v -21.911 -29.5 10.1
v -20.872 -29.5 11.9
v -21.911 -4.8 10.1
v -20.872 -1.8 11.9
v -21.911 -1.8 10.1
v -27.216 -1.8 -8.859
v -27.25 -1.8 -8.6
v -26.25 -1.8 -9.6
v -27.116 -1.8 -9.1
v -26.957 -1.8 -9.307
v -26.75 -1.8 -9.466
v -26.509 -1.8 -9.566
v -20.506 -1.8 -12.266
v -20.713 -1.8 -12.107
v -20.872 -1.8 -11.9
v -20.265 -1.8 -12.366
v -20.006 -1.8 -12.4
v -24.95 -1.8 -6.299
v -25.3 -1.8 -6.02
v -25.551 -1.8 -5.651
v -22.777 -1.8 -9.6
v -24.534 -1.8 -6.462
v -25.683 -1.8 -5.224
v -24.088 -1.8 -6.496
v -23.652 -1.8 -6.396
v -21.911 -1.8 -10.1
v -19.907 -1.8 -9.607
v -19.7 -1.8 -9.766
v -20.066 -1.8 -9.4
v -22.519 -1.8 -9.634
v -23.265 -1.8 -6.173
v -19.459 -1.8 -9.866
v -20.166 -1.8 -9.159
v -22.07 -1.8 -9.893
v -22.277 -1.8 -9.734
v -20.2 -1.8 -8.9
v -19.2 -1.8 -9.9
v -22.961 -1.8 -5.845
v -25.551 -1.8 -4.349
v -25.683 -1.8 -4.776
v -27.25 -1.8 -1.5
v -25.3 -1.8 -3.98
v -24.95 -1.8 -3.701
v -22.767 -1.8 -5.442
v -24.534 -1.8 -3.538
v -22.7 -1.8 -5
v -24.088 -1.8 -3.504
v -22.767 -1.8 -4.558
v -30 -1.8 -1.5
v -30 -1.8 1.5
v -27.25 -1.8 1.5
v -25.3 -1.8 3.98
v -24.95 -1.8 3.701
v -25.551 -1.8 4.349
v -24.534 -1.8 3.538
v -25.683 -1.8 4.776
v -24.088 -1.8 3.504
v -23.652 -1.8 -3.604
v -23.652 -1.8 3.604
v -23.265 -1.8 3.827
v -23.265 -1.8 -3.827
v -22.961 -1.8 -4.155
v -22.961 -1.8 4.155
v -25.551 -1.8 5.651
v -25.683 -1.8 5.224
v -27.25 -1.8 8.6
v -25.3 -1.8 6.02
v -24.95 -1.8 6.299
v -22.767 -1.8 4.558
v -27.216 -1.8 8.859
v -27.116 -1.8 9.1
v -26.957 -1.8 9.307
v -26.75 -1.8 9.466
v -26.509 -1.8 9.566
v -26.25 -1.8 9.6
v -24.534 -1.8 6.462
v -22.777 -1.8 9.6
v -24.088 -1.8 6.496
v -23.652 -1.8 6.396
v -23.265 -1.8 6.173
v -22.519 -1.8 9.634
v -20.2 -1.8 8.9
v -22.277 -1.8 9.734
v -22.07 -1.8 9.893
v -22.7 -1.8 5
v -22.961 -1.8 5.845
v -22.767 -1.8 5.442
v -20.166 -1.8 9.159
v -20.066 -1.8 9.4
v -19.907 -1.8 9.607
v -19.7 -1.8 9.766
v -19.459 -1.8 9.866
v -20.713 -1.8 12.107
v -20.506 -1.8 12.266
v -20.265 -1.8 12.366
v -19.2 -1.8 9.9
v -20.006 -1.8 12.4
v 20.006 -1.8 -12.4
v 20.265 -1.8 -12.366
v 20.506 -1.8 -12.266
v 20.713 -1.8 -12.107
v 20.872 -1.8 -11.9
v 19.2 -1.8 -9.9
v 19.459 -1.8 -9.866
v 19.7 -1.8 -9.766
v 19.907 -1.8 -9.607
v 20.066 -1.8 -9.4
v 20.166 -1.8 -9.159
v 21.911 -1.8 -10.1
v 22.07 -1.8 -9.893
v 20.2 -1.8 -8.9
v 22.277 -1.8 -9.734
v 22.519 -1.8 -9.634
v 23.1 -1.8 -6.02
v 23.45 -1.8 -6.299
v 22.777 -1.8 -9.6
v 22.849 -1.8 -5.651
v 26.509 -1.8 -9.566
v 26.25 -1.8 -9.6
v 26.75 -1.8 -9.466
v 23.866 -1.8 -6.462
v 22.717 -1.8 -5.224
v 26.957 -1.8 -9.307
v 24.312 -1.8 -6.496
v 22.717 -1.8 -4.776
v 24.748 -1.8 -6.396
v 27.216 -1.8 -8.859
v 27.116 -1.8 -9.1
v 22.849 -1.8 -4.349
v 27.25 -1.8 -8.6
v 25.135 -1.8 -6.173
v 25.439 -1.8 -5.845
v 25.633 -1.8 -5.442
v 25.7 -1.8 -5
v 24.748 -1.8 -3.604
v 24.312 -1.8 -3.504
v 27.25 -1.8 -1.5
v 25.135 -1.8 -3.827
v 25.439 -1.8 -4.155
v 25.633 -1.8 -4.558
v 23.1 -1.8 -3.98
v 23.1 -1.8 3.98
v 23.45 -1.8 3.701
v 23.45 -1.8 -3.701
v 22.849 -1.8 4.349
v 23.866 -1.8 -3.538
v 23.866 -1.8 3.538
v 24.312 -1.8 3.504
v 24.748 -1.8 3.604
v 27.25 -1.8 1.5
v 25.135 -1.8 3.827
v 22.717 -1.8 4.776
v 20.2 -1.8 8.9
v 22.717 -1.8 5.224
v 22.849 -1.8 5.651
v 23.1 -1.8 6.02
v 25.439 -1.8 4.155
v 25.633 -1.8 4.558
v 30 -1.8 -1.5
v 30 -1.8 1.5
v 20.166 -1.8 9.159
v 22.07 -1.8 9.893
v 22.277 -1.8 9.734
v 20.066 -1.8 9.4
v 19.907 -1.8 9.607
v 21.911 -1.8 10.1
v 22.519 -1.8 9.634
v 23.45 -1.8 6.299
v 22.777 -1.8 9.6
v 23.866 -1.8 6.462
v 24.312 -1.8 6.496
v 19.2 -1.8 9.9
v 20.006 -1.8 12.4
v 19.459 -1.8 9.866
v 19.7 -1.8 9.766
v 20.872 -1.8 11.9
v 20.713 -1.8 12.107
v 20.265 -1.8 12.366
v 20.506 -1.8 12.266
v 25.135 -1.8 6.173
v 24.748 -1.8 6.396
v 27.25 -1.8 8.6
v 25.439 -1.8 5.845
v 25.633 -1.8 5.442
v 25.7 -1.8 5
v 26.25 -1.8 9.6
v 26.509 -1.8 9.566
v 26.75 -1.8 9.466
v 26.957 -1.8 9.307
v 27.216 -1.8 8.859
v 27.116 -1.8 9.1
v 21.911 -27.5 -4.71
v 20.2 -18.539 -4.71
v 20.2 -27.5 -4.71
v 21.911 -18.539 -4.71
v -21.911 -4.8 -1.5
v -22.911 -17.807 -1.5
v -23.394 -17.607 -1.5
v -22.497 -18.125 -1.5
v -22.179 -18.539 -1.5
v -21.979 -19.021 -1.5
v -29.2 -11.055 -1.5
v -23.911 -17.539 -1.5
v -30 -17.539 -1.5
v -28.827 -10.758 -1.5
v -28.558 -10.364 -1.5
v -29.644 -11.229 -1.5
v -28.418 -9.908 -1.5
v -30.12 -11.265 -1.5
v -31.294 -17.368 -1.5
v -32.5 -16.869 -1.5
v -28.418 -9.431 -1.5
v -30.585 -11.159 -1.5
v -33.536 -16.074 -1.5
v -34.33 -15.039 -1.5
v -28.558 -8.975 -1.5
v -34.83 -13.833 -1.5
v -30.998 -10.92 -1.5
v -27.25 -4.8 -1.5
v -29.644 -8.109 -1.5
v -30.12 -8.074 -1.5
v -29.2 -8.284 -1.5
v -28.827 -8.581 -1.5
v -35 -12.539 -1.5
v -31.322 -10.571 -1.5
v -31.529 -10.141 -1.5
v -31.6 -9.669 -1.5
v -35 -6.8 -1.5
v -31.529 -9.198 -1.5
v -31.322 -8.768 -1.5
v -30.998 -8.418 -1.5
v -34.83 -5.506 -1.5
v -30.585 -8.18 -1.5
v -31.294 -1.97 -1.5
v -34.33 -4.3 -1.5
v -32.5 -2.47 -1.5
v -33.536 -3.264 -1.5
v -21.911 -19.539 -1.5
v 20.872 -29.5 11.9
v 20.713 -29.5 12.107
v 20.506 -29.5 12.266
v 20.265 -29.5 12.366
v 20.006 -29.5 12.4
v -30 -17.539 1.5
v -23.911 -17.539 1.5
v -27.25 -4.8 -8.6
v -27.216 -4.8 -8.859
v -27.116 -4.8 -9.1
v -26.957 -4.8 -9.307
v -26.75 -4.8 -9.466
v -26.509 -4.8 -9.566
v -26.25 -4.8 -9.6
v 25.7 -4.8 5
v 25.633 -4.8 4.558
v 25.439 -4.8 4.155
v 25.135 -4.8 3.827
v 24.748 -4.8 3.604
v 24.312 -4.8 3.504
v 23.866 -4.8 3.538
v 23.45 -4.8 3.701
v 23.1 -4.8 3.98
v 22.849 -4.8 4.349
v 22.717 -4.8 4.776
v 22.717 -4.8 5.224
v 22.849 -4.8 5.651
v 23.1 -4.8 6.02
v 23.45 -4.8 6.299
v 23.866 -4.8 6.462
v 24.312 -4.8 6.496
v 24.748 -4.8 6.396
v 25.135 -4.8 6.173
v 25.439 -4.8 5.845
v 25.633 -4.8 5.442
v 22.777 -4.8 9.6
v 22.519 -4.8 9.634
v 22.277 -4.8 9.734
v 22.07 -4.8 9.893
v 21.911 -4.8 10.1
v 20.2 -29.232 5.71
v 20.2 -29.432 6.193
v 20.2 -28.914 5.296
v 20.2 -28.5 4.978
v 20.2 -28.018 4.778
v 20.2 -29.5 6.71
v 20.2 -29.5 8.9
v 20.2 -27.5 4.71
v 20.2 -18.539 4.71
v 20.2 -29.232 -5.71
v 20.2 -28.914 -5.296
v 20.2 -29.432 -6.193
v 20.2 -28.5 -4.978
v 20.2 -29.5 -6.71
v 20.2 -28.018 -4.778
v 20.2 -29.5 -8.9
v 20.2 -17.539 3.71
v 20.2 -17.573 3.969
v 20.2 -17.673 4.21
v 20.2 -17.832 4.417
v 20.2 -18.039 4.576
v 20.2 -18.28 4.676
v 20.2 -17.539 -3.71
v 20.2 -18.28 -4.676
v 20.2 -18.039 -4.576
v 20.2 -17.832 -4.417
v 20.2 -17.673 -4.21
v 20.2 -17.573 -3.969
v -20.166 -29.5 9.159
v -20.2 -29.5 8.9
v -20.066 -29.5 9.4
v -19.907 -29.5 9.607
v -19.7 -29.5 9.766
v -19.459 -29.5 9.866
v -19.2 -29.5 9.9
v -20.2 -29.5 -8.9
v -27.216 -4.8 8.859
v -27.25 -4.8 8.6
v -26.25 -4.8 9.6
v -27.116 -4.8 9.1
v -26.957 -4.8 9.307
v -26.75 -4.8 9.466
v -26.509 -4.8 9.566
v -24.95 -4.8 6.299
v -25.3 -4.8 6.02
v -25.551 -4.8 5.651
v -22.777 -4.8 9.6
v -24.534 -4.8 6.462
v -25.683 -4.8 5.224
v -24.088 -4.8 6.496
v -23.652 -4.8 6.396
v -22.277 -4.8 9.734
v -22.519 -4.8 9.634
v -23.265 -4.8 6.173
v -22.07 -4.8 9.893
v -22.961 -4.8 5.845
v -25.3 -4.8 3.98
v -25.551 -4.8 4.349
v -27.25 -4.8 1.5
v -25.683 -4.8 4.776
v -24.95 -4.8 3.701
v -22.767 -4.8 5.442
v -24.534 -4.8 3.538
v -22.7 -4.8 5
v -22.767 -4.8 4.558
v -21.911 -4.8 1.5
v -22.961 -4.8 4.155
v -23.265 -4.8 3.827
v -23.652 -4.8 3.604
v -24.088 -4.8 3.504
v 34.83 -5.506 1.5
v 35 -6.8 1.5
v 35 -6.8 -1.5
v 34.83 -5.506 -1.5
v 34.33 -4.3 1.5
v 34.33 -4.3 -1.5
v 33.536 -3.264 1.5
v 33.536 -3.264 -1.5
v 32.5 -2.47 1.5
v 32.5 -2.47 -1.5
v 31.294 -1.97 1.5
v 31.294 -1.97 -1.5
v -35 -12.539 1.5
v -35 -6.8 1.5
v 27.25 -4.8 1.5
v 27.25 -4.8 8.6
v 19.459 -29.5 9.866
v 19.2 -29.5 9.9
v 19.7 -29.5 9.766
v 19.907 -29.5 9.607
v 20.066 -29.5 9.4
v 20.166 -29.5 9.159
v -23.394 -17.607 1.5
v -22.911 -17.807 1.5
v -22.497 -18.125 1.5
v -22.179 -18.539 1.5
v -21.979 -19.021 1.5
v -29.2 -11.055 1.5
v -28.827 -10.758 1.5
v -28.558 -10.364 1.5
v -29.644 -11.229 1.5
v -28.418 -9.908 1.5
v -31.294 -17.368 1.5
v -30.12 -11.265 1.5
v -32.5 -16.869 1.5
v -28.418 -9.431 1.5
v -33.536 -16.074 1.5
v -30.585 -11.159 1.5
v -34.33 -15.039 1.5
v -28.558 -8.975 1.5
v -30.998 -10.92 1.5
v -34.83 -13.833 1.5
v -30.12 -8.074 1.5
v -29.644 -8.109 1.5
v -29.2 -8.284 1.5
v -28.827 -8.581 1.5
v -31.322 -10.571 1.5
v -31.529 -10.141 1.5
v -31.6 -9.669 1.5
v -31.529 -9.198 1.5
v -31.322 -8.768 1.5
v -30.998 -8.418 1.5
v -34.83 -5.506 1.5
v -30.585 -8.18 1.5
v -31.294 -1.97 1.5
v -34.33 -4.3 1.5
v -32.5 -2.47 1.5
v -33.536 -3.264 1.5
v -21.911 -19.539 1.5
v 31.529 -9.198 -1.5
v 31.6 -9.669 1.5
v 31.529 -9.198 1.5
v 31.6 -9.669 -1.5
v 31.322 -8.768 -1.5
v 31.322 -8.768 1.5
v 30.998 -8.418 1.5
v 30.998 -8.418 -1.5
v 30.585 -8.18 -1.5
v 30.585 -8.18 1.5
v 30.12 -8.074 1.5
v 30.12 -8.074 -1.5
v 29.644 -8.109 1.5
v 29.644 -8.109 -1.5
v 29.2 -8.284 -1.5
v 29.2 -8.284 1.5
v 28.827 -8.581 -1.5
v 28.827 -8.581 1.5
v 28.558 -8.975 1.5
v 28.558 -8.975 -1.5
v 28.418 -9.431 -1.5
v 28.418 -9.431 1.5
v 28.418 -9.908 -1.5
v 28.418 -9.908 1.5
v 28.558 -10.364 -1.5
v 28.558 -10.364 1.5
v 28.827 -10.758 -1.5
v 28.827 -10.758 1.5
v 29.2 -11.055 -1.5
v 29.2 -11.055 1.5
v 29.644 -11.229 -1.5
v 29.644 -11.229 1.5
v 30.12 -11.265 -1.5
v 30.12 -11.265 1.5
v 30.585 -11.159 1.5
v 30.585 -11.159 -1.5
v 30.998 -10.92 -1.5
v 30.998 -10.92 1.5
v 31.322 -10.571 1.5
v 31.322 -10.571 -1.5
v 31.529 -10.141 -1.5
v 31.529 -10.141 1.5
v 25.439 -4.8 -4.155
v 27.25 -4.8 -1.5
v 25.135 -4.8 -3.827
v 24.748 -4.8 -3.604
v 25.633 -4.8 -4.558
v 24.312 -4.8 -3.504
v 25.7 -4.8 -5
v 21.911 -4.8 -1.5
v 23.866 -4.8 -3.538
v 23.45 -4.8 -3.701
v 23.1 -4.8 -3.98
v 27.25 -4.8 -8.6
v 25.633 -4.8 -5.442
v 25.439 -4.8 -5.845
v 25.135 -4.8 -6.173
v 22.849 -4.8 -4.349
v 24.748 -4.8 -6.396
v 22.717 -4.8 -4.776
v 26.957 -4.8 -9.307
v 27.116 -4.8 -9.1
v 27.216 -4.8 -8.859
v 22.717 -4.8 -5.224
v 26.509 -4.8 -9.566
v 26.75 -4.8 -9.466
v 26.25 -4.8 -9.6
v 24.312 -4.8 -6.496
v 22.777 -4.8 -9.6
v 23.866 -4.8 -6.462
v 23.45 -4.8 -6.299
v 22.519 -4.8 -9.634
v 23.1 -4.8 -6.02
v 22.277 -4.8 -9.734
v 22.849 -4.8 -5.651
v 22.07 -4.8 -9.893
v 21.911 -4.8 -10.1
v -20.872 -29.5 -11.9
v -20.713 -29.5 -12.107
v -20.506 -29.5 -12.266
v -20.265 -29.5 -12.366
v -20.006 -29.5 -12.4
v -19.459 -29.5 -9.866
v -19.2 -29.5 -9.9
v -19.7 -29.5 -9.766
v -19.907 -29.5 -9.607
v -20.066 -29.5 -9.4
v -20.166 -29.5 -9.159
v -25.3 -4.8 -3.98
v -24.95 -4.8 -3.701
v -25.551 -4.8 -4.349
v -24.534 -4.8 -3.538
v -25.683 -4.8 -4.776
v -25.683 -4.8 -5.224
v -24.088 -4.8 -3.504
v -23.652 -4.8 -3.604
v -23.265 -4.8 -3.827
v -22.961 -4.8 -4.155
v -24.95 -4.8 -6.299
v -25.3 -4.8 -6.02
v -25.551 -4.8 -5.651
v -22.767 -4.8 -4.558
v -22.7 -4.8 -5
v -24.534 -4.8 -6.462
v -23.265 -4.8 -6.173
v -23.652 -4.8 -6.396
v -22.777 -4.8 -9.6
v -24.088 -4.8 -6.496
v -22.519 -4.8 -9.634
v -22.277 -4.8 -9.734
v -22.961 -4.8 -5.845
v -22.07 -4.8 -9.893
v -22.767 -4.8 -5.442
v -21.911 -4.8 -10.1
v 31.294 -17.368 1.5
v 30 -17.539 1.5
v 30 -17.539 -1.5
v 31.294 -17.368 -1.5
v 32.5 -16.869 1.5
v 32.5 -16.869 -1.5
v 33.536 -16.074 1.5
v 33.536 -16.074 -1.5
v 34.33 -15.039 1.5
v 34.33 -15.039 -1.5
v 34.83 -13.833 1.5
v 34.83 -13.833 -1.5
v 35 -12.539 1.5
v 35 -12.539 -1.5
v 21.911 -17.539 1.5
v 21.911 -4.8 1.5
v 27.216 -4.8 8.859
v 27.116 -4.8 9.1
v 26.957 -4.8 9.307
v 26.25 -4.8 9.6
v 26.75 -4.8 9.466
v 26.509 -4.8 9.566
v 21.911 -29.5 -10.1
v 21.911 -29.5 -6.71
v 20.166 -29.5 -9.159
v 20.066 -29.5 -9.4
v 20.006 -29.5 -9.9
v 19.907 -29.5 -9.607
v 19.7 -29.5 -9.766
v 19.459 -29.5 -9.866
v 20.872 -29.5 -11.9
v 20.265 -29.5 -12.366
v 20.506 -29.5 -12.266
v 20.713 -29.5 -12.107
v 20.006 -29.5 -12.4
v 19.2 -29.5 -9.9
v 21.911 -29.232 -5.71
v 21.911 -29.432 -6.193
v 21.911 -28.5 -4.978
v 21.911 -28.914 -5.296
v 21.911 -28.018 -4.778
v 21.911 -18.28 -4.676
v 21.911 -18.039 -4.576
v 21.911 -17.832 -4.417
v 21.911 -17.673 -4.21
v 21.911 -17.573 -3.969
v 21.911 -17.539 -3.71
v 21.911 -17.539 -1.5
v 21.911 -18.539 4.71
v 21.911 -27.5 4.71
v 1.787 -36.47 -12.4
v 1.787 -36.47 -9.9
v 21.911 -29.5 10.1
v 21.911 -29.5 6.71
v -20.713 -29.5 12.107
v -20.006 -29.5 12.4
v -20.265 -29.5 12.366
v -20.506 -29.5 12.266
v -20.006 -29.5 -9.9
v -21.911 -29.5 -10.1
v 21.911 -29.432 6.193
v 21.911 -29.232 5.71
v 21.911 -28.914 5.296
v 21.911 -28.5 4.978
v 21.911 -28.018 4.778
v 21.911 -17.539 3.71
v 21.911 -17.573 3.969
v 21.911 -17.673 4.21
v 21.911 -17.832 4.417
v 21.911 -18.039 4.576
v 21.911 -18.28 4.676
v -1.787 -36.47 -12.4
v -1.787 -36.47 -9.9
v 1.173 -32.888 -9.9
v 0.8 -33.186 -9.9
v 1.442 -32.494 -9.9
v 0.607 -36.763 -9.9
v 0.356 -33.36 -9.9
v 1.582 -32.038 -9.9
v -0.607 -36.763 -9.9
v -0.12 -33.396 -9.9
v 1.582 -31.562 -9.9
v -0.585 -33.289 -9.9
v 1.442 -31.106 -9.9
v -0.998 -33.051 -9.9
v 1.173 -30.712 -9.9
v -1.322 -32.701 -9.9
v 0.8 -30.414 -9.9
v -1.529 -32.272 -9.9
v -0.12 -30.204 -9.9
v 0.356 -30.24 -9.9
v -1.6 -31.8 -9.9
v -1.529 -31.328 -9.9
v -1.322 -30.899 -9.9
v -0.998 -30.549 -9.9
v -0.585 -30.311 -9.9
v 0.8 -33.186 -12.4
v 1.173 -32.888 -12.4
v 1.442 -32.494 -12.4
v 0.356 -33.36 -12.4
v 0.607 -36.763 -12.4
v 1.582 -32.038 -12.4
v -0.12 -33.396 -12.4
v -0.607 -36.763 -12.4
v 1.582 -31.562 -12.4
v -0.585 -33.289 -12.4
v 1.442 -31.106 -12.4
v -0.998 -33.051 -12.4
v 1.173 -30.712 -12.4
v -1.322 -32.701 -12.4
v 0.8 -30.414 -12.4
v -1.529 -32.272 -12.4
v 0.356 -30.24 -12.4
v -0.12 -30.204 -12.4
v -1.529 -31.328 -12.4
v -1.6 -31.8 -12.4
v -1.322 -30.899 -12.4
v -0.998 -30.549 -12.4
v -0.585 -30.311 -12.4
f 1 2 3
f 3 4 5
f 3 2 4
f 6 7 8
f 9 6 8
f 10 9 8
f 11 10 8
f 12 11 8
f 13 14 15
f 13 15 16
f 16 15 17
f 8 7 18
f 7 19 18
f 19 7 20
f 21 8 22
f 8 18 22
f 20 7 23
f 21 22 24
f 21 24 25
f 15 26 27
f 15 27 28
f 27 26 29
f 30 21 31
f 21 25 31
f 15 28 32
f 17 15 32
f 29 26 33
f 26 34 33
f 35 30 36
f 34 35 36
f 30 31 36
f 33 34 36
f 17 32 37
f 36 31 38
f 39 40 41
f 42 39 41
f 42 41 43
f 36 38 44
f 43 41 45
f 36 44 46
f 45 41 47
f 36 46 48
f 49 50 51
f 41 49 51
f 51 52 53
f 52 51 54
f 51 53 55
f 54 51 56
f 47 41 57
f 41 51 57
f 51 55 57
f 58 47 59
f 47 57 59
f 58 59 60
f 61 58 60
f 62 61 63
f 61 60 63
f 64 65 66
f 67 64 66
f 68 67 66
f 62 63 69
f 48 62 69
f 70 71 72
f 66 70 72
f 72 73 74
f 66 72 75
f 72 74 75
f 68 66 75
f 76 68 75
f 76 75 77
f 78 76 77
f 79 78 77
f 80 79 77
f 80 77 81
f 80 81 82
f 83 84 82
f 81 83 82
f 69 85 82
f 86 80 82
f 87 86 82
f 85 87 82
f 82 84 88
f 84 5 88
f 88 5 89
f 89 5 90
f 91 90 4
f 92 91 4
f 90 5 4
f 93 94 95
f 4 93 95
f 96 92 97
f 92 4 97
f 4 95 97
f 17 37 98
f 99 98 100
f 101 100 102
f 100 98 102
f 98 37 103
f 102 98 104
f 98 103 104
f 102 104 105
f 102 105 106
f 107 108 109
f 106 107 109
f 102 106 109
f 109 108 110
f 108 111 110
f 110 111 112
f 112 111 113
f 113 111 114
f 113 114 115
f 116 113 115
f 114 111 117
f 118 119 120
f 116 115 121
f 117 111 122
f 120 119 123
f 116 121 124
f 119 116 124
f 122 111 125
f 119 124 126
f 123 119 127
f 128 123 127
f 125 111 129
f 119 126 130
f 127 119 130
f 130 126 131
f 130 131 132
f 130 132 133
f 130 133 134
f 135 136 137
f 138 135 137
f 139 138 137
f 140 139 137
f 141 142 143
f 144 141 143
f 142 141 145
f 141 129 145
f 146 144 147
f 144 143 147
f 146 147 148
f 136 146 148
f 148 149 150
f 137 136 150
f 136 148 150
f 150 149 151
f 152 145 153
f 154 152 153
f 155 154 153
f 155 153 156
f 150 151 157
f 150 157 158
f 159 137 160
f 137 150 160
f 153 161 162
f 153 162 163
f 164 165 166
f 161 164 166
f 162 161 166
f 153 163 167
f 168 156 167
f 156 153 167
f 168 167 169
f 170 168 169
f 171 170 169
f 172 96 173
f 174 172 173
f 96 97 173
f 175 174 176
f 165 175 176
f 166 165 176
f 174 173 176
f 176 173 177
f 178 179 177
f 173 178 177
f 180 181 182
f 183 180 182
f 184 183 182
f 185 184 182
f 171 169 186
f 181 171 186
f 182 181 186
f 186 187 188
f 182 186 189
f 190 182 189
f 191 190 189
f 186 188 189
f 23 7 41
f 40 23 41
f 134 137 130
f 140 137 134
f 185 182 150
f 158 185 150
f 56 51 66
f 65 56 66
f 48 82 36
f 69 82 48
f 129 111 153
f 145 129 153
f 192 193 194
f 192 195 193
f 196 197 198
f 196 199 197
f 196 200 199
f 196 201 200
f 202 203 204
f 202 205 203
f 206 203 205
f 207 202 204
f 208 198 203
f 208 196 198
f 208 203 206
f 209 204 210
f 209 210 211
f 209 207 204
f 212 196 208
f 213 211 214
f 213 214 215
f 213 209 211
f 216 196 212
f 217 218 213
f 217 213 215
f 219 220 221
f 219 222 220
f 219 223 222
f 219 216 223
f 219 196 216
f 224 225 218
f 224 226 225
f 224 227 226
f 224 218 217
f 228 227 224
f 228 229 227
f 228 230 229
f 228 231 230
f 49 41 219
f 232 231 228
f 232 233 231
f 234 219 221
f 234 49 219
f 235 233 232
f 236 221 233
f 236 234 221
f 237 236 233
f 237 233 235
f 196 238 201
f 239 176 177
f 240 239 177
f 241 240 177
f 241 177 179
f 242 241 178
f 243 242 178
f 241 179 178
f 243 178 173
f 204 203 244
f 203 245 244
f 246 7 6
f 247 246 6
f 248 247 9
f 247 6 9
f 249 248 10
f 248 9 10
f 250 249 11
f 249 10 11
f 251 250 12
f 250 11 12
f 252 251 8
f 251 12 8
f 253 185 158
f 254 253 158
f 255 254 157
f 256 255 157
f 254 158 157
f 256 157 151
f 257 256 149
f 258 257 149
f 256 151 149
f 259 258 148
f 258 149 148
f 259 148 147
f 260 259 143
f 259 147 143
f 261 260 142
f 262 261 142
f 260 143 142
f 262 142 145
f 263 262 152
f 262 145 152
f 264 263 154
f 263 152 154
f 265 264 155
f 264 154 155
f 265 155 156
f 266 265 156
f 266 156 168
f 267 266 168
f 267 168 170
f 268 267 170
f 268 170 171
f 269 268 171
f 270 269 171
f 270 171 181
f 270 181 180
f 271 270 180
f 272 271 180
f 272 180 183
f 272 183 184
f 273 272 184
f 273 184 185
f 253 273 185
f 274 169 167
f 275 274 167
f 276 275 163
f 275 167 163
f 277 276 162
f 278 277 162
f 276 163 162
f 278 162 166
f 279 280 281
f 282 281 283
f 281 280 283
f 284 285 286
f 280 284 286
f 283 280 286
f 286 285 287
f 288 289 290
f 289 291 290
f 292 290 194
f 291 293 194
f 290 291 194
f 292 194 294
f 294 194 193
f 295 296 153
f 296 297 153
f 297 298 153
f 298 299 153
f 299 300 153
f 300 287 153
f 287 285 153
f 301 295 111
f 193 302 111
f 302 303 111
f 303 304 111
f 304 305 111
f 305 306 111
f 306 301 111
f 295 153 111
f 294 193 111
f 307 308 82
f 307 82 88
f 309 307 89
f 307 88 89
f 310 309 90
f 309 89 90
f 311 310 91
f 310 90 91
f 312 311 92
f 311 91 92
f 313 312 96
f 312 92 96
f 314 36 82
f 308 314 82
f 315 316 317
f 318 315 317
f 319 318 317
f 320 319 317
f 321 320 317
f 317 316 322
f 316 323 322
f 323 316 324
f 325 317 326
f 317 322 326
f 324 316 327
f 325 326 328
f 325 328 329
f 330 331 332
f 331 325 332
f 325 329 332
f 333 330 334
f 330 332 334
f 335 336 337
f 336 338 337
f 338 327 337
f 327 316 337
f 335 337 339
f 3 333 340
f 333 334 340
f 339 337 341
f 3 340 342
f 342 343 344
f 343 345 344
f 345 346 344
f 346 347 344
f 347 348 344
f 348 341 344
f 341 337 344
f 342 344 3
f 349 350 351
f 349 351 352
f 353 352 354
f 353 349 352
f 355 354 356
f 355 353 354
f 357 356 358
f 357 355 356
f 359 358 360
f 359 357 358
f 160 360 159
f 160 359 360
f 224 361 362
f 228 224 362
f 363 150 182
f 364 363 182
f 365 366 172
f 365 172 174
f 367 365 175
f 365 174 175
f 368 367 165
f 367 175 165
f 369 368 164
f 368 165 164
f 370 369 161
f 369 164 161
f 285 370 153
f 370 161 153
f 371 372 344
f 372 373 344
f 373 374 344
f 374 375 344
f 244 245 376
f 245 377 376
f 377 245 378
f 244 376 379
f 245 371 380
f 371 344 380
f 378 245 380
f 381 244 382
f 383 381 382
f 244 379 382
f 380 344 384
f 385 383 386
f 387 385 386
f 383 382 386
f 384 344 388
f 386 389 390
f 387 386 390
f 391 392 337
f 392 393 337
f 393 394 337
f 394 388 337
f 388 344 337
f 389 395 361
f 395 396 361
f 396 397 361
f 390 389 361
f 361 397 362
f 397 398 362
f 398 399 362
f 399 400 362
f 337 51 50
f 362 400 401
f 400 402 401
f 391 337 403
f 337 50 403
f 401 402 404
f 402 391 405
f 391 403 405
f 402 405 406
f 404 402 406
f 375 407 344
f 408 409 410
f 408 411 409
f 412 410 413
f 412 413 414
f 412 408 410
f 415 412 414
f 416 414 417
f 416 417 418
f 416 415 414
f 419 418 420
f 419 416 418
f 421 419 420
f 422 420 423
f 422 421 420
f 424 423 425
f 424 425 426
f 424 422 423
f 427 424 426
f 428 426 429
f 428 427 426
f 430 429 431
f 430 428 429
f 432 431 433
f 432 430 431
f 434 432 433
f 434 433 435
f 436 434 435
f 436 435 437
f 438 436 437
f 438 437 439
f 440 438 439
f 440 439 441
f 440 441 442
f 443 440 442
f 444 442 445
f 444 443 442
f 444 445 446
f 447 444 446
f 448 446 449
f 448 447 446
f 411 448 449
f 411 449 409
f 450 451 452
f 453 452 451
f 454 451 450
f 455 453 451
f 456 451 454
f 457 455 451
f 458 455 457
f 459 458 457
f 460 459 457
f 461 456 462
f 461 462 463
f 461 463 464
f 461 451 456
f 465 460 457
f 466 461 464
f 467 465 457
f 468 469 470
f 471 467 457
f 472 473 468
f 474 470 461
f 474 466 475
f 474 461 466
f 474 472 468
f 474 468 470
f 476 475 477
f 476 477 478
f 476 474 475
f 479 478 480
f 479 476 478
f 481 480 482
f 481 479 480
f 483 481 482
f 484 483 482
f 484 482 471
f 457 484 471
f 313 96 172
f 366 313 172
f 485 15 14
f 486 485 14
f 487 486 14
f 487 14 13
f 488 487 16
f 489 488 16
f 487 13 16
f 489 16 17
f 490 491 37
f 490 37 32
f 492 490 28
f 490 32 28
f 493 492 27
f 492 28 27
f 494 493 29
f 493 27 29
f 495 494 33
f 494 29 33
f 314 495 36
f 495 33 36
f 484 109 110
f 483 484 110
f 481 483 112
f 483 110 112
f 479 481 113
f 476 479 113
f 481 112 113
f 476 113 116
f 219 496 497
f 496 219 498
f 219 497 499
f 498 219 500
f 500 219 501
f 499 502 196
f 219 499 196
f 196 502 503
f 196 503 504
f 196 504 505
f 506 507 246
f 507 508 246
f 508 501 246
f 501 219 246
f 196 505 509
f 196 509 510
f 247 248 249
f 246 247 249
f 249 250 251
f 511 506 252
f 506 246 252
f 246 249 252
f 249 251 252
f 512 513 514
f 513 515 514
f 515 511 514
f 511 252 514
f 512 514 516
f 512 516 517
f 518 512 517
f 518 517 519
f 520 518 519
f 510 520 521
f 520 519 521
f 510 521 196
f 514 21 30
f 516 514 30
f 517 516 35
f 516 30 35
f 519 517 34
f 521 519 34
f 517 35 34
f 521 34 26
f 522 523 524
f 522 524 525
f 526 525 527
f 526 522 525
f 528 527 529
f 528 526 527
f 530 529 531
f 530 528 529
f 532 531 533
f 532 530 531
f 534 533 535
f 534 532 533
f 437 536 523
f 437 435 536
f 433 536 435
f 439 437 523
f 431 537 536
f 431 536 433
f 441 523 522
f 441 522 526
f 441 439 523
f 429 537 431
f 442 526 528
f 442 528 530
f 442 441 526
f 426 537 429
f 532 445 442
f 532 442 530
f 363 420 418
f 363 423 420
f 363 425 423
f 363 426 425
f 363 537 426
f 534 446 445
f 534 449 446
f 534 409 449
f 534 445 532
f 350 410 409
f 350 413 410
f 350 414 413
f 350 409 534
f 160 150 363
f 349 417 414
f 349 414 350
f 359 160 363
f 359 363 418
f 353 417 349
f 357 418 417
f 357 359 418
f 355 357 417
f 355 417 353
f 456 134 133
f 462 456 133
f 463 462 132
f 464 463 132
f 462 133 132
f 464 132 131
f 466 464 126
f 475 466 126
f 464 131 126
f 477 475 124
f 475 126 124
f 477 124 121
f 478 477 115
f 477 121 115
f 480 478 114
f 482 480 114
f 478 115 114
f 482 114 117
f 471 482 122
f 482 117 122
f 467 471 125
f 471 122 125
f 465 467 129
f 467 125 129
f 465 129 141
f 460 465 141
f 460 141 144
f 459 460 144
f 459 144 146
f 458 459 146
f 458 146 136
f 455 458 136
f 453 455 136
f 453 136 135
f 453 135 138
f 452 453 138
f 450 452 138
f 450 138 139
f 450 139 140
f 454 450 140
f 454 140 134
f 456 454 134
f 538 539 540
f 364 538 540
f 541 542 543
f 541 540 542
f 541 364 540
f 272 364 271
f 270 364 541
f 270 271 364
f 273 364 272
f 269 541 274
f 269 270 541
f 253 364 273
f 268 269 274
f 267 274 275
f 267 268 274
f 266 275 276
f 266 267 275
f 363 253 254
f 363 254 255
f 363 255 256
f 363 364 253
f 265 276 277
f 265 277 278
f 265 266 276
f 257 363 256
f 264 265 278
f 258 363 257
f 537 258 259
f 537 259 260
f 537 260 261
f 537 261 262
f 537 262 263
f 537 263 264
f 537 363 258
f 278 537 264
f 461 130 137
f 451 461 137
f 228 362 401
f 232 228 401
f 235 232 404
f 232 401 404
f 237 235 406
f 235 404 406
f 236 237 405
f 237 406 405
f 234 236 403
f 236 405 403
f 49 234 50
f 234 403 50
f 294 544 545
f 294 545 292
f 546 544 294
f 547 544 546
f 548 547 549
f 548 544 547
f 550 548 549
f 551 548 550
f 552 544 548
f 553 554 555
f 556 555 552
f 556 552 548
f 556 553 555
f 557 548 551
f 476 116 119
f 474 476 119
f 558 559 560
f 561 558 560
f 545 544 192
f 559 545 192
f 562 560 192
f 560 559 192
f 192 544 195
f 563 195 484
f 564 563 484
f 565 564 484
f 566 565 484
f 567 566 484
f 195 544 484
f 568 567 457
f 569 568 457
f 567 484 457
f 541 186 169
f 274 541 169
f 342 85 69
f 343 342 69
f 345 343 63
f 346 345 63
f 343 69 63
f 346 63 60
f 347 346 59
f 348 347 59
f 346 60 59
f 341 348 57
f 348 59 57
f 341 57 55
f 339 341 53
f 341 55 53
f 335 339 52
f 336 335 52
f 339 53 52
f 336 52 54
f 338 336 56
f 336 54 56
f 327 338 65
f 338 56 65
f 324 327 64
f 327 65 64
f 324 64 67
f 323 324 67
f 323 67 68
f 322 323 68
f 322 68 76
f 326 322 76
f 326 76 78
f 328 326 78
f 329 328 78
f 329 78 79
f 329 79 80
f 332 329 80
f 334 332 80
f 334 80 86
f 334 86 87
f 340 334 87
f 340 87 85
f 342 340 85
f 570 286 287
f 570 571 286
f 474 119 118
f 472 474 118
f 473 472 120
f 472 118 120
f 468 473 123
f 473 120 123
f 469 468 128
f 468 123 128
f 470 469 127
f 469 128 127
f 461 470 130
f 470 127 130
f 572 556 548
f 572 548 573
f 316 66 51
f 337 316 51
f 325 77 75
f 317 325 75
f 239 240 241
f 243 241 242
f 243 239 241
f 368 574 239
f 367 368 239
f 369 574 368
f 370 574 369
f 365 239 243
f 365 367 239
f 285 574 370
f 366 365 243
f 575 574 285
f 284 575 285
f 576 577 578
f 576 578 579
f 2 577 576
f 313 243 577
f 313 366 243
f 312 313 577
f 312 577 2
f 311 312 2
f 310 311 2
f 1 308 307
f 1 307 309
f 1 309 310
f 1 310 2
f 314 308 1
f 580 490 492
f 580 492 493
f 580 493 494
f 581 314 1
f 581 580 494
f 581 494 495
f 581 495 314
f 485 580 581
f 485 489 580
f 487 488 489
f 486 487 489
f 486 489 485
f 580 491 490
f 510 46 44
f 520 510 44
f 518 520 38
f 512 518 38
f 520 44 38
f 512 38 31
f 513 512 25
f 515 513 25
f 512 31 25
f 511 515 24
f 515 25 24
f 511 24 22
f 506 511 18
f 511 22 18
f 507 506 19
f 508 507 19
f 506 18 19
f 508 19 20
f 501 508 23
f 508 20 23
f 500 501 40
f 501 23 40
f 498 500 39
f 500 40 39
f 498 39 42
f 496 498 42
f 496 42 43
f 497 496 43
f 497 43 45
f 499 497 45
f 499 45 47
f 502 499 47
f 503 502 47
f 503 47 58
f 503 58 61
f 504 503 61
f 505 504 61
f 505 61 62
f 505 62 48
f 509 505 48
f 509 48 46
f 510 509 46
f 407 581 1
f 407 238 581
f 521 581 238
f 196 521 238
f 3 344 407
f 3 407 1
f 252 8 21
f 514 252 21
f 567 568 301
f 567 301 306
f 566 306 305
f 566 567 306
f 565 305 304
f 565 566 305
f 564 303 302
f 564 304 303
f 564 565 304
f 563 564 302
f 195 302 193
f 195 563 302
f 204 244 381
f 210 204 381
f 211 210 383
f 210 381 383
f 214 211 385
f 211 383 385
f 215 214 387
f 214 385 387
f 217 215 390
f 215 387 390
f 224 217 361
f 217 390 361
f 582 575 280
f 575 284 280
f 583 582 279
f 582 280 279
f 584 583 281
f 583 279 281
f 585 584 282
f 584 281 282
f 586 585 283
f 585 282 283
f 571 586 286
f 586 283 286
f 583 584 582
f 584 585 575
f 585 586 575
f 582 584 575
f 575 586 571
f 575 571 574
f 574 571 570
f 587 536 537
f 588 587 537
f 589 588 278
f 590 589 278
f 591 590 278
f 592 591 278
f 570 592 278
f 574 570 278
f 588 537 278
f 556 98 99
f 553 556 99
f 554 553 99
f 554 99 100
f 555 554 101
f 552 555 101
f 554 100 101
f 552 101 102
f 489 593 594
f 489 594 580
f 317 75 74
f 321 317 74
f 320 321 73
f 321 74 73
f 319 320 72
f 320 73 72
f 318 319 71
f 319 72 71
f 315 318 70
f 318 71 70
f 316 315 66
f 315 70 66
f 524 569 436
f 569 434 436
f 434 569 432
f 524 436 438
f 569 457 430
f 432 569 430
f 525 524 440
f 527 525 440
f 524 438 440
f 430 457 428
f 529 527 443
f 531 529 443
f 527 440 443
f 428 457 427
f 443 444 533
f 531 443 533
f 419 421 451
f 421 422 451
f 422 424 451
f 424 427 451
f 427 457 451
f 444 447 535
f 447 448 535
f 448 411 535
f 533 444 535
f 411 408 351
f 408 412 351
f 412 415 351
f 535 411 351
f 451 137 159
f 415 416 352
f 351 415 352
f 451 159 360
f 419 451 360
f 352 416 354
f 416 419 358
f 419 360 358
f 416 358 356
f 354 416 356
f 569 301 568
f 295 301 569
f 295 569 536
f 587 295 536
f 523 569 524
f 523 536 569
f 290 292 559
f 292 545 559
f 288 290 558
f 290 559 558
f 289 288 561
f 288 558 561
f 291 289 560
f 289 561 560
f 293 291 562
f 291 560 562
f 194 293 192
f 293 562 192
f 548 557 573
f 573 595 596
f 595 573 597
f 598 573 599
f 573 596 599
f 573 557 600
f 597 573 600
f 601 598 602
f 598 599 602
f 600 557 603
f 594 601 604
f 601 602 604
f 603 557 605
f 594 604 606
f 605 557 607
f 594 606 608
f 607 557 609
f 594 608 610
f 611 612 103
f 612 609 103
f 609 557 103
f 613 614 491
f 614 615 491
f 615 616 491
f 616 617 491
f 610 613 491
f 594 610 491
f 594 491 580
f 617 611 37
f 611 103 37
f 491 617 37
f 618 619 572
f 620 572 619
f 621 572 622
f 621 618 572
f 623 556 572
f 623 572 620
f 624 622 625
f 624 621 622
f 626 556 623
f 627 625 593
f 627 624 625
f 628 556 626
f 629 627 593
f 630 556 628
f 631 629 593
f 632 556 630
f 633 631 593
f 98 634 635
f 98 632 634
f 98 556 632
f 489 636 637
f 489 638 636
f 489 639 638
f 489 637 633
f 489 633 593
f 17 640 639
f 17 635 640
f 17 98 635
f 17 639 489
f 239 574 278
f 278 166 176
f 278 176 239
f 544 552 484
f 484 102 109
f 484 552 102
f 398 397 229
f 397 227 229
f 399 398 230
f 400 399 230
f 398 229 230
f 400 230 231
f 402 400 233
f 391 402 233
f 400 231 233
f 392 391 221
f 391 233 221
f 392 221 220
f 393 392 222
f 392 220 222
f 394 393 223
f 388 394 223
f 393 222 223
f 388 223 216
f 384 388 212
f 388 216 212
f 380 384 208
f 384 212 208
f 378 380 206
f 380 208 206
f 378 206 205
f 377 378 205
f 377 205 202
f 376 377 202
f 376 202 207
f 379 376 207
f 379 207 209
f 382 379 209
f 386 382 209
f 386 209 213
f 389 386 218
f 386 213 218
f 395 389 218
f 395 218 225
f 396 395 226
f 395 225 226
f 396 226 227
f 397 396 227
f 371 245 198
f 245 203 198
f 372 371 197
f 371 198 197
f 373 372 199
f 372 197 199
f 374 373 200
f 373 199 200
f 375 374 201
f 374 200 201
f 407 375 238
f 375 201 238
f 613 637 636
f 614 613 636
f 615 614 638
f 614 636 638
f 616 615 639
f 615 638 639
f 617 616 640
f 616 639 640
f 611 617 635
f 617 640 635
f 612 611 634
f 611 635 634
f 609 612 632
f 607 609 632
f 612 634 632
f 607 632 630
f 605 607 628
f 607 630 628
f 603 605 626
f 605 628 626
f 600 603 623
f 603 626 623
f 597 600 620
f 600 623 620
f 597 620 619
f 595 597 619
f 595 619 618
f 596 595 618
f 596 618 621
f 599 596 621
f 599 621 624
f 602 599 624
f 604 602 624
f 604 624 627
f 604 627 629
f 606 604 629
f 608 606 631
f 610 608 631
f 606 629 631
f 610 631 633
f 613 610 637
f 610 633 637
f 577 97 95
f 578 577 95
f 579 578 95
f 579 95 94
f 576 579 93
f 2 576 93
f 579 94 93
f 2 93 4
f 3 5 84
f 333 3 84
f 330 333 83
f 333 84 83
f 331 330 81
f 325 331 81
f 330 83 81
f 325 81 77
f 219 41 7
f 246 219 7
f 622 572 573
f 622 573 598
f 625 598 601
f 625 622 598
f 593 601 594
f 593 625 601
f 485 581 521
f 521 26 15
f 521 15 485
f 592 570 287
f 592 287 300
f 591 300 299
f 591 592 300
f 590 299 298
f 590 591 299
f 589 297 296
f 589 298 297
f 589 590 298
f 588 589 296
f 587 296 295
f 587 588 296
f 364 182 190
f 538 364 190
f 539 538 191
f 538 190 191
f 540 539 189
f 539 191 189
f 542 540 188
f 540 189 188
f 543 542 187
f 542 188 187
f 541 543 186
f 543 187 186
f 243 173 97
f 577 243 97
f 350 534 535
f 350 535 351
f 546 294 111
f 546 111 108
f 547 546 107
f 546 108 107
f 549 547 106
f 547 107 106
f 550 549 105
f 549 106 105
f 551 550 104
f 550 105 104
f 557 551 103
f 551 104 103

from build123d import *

# Parameters (mm, degrees)
SCHIZZO3_R                   = 1.5
ESTRUSIONE_ESTRUSIONE2_DEPTH = 27.7
TAGLIO_ESTRUSIONE1_REACH     = 56.5
TAGLIO_ESTRUSIONE2_START     = -3
TAGLIO_ESTRUSIONE2_DEPTH     = 24.7
RACCORDO1_R                  = 2
SCHIZZO6_R                   = 1.6
ESTRUSIONE_ESTRUSIONE3_DEPTH = 1.5
SCHIZZO8_R                   = 1.6
ESTRUSIONE_ESTRUSIONE4_DEPTH = 2.5
RACCORDO2_R                  = 2


with BuildPart() as part:
    # Schizzo3 → Estrusione-Estrusione2 (new body)
    with BuildSketch(Plane(origin=(0, -1.8, 0), x_dir=(1, 0, 0), z_dir=(0, 1, 0))):
        with BuildLine():
            Line((27.25, -1.6), (27.25, -8.6))
            ThreePointArc((27.25, -8.6), (26.957106781, -9.307106781), (26.25, -9.6))
            Line((26.25, -9.6), (22.777350269, -9.6))
            ThreePointArc((22.777350269, -9.6), (22.277350269, -9.733974596), (21.911324865, -10.1))
            Line((21.911324865, -10.1), (20.872094381, -11.9))
            ThreePointArc((20.872094381, -11.9), (20.506068977, -12.266025404), (20.006068977, -12.4))
            Line((20.006068977, -12.4), (-20.006068977, -12.4))
            ThreePointArc((-20.006068977, -12.4), (-20.506068977, -12.266025404), (-20.872094381, -11.9))
            Line((-20.872094381, -11.9), (-21.911324865, -10.1))
            ThreePointArc((-21.911324865, -10.1), (-22.277350269, -9.733974596), (-22.777350269, -9.6))
            Line((-22.777350269, -9.6), (-26.25, -9.6))
            ThreePointArc((-26.25, -9.6), (-26.957106781, -9.307106781), (-27.25, -8.6))
            Line((-27.25, -8.6), (-27.25, -1.6))
            Line((-27.25, -1.6), (-27.25, 1.6))
            Line((-27.25, 1.6), (-27.25, 8.6))
            ThreePointArc((-27.25, 8.6), (-26.957106781, 9.307106781), (-26.25, 9.6))
            Line((-26.25, 9.6), (-22.777350269, 9.6))
            ThreePointArc((-22.777350269, 9.6), (-22.277350269, 9.733974596), (-21.911324865, 10.1))
            Line((-21.911324865, 10.1), (-20.872094381, 11.9))
            ThreePointArc((-20.872094381, 11.9), (-20.506068977, 12.266025404), (-20.006068977, 12.4))
            Line((-20.006068977, 12.4), (20.006068977, 12.4))
            ThreePointArc((20.006068977, 12.4), (20.506068977, 12.266025404), (20.872094381, 11.9))
            Line((20.872094381, 11.9), (21.911324865, 10.1))
            ThreePointArc((21.911324865, 10.1), (22.277350269, 9.733974596), (22.777350269, 9.6))
            Line((22.777350269, 9.6), (26.25, 9.6))
            ThreePointArc((26.25, 9.6), (26.957106781, 9.307106781), (27.25, 8.6))
            Line((27.25, 8.6), (27.25, 1.6))
            Line((27.25, 1.6), (27.25, -1.6))
        make_face()
        with Locations((24.2, -5)):
            Circle(SCHIZZO3_R, mode=Mode.SUBTRACT)
        with Locations((24.2, 5)):
            Circle(SCHIZZO3_R, mode=Mode.SUBTRACT)
        with Locations((-24.2, 5)):
            Circle(SCHIZZO3_R, mode=Mode.SUBTRACT)
        with Locations((-24.2, -5)):
            Circle(SCHIZZO3_R, mode=Mode.SUBTRACT)
        with BuildLine():
            Line((-19.2, -9.9), (19.2, -9.9))
            ThreePointArc((19.2, -9.9), (19.907106781, -9.607106781), (20.2, -8.9))
            Line((20.2, -8.9), (20.2, 8.9))
            ThreePointArc((20.2, 8.9), (19.907106781, 9.607106781), (19.2, 9.9))
            Line((19.2, 9.9), (-19.2, 9.9))
            ThreePointArc((-19.2, 9.9), (-19.907106781, 9.607106781), (-20.2, 8.9))
            Line((-20.2, 8.9), (-20.2, -8.9))
            ThreePointArc((-20.2, -8.9), (-19.907106781, -9.607106781), (-19.2, -9.9))
        make_face(mode=Mode.SUBTRACT)
    extrude(amount=-ESTRUSIONE_ESTRUSIONE2_DEPTH)

    # Schizzo4 → Taglio-Estrusione1 (cut, up to next)
    with BuildSketch(Plane(origin=(27.25, 0, 0), x_dir=(0, 0, -1), z_dir=(1, 0, 0)), mode=Mode.PRIVATE) as taglio_estrusione1_sk1:
        with BuildLine():
            Line((-3.710237866, -17.5387571), (3.710237866, -17.5387571))
            ThreePointArc((3.710237866, -17.5387571), (4.417344647, -17.831650319), (4.710237866, -18.5387571))
            Line((4.710237866, -18.5387571), (4.710237866, -30.61702325))
            ThreePointArc((4.710237866, -30.61702325), (4.417344647, -31.324130031), (3.710237866, -31.61702325))
            Line((3.710237866, -31.61702325), (-3.710237866, -31.61702325))
            ThreePointArc((-3.710237866, -31.61702325), (-4.417344647, -31.324130031), (-4.710237866, -30.61702325))
            Line((-4.710237866, -30.61702325), (-4.710237866, -18.5387571))
            ThreePointArc((-4.710237866, -18.5387571), (-4.417344647, -17.831650319), (-3.710237866, -17.5387571))
        make_face()
    taglio_estrusione1_tool1 = extrude(taglio_estrusione1_sk1.sketch, amount=-TAGLIO_ESTRUSIONE1_REACH, mode=Mode.PRIVATE) & part.part
    add(taglio_estrusione1_tool1.solids().sort_by_distance((27.25, -24.57789, 0))[0], mode=Mode.SUBTRACT)

    # Schizzo5 → Taglio-Estrusione2 (cut)
    with BuildSketch(Plane(origin=(0, -1.8, 0), x_dir=(1, 0, 0), z_dir=(0, 1, 0)).offset(TAGLIO_ESTRUSIONE2_START)):
        Polygon((27.25, 8.6), (27.25, -8.6), (27.507432363, -11.370727038), (21.911324865, -11.370727038), (21.911324865, -9.6), (21.911324865, 9.6), (21.911324865, 11.665734377), (27.25, 11.503675338), align=None)
    taglio_estrusione2 = extrude(amount=-TAGLIO_ESTRUSIONE2_DEPTH, mode=Mode.SUBTRACT)

    # Specchia1: Taglio-Estrusione2 across plane
    add(taglio_estrusione2.mirror(Plane(origin=(0, 0, 0), x_dir=(0, 0, 1), z_dir=(1, 0, 0))), mode=Mode.SUBTRACT)

    # Raccordo1
    raccordo1_edges = [part.edges().sort_by_distance(p)[0] for p in [
        (21.055662433, -29.5, -4.710237866),
        (21.055662433, -29.5, 4.710237866),
    ]]
    fillet(raccordo1_edges, radius=RACCORDO1_R)

    # Schizzo6 → Estrusione-Estrusione3 (add, symmetric)
    with BuildSketch(Plane.XY):
        with BuildLine():
            Line((21.911324865, -17.5387571), (30, -17.5387571))
            ThreePointArc((30, -17.5387571), (33.535533906, -16.074291006), (35, -12.5387571))
            Line((35, -12.5387571), (35, -6.8))
            ThreePointArc((35, -6.8), (33.535533906, -3.264466094), (30, -1.8))
            Line((30, -1.8), (21.911324865, -1.8))
            Line((21.911324865, -1.8), (21.911324865, -17.5387571))
        make_face()
        with Locations((30, -9.66937855)):
            Circle(SCHIZZO6_R, mode=Mode.SUBTRACT)
    estrusione_estrusione3 = extrude(amount=ESTRUSIONE_ESTRUSIONE3_DEPTH, both=True)

    # Schizzo8 → Estrusione-Estrusione4 (add)
    with BuildSketch(Plane(origin=(0, 0, -12.4), x_dir=(-1, 0, 0), z_dir=(0, 0, -1))):
        with BuildLine():
            Line((-20.006068977, -29.5), (-1.786501868, -36.469947652))
            ThreePointArc((-1.786501868, -36.469947652), (0, -36.8), (1.786501868, -36.469947652))
            Line((1.786501868, -36.469947652), (20.006068977, -29.5))
            Line((20.006068977, -29.5), (-20.006068977, -29.5))
        make_face()
        with Locations((0, -31.8)):
            Circle(SCHIZZO8_R, mode=Mode.SUBTRACT)
    extrude(amount=-ESTRUSIONE_ESTRUSIONE4_DEPTH)

    # Specchia2: Estrusione-Estrusione3 across plane
    add(estrusione_estrusione3.mirror(Plane(origin=(0, 0, 0), x_dir=(0, 0, 1), z_dir=(1, 0, 0))))

    # Raccordo2
    raccordo2_edges = [part.edges().sort_by_distance(p)[0] for p in [
        (-21.911324865, -17.5387571, 0),
    ]]
    fillet(raccordo2_edges, radius=RACCORDO2_R)


solid = part.part
